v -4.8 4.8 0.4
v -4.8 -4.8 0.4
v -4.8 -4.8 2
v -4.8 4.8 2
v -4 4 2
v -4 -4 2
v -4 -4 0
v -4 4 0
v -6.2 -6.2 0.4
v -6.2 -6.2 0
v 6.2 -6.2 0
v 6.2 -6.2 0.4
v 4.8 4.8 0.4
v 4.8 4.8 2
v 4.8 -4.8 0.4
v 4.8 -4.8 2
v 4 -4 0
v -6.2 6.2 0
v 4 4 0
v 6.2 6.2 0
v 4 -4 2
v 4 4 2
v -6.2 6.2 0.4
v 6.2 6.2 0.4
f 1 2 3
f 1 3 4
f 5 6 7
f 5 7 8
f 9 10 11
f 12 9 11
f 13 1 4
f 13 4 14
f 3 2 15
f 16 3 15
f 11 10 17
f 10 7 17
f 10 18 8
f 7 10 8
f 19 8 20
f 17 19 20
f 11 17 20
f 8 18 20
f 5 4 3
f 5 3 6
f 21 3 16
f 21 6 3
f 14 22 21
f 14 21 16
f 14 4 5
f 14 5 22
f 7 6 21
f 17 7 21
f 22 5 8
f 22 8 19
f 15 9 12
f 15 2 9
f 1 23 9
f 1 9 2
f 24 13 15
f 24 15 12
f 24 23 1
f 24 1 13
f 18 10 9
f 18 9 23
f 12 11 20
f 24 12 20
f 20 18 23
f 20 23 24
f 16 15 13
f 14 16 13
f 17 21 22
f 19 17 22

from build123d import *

# Parameters (mm, degrees)
F0_W     = 9.6
F0_H     = 9.6
F1_DEPTH = 2
F2_T     = -0.8
F0_W_2   = 12.4
F0_H_2   = 12.4
F3_DEPTH = 0.4
F4_DEPTH = 1


with BuildPart() as f1:
    # F0 (on Top) → F1 (new body)
    with BuildSketch(Plane.XY):
        Rectangle(F0_W, F0_H)
    extrude(amount=F1_DEPTH)

    # F2
    f2_openings = [f1.faces().sort_by_distance(p)[0] for p in [
        (0, 0, 2),
    ]]
    offset(amount=F2_T, openings=f2_openings)

    # F0 (on Top) → F3 (join)
    with BuildSketch(Plane.XY):
        Rectangle(F0_W_2, F0_H_2)
        Rectangle(F0_W, F0_H, mode=Mode.SUBTRACT)
    extrude(amount=F3_DEPTH)

    # F4 (cut): a face of the model
    f4_faces = [f1.faces().sort_by_distance(p)[0] for p in [
        (0, 0, 0.8),
    ]]
    extrude(f4_faces, amount=-F4_DEPTH, mode=Mode.SUBTRACT)


solid = f1.part
